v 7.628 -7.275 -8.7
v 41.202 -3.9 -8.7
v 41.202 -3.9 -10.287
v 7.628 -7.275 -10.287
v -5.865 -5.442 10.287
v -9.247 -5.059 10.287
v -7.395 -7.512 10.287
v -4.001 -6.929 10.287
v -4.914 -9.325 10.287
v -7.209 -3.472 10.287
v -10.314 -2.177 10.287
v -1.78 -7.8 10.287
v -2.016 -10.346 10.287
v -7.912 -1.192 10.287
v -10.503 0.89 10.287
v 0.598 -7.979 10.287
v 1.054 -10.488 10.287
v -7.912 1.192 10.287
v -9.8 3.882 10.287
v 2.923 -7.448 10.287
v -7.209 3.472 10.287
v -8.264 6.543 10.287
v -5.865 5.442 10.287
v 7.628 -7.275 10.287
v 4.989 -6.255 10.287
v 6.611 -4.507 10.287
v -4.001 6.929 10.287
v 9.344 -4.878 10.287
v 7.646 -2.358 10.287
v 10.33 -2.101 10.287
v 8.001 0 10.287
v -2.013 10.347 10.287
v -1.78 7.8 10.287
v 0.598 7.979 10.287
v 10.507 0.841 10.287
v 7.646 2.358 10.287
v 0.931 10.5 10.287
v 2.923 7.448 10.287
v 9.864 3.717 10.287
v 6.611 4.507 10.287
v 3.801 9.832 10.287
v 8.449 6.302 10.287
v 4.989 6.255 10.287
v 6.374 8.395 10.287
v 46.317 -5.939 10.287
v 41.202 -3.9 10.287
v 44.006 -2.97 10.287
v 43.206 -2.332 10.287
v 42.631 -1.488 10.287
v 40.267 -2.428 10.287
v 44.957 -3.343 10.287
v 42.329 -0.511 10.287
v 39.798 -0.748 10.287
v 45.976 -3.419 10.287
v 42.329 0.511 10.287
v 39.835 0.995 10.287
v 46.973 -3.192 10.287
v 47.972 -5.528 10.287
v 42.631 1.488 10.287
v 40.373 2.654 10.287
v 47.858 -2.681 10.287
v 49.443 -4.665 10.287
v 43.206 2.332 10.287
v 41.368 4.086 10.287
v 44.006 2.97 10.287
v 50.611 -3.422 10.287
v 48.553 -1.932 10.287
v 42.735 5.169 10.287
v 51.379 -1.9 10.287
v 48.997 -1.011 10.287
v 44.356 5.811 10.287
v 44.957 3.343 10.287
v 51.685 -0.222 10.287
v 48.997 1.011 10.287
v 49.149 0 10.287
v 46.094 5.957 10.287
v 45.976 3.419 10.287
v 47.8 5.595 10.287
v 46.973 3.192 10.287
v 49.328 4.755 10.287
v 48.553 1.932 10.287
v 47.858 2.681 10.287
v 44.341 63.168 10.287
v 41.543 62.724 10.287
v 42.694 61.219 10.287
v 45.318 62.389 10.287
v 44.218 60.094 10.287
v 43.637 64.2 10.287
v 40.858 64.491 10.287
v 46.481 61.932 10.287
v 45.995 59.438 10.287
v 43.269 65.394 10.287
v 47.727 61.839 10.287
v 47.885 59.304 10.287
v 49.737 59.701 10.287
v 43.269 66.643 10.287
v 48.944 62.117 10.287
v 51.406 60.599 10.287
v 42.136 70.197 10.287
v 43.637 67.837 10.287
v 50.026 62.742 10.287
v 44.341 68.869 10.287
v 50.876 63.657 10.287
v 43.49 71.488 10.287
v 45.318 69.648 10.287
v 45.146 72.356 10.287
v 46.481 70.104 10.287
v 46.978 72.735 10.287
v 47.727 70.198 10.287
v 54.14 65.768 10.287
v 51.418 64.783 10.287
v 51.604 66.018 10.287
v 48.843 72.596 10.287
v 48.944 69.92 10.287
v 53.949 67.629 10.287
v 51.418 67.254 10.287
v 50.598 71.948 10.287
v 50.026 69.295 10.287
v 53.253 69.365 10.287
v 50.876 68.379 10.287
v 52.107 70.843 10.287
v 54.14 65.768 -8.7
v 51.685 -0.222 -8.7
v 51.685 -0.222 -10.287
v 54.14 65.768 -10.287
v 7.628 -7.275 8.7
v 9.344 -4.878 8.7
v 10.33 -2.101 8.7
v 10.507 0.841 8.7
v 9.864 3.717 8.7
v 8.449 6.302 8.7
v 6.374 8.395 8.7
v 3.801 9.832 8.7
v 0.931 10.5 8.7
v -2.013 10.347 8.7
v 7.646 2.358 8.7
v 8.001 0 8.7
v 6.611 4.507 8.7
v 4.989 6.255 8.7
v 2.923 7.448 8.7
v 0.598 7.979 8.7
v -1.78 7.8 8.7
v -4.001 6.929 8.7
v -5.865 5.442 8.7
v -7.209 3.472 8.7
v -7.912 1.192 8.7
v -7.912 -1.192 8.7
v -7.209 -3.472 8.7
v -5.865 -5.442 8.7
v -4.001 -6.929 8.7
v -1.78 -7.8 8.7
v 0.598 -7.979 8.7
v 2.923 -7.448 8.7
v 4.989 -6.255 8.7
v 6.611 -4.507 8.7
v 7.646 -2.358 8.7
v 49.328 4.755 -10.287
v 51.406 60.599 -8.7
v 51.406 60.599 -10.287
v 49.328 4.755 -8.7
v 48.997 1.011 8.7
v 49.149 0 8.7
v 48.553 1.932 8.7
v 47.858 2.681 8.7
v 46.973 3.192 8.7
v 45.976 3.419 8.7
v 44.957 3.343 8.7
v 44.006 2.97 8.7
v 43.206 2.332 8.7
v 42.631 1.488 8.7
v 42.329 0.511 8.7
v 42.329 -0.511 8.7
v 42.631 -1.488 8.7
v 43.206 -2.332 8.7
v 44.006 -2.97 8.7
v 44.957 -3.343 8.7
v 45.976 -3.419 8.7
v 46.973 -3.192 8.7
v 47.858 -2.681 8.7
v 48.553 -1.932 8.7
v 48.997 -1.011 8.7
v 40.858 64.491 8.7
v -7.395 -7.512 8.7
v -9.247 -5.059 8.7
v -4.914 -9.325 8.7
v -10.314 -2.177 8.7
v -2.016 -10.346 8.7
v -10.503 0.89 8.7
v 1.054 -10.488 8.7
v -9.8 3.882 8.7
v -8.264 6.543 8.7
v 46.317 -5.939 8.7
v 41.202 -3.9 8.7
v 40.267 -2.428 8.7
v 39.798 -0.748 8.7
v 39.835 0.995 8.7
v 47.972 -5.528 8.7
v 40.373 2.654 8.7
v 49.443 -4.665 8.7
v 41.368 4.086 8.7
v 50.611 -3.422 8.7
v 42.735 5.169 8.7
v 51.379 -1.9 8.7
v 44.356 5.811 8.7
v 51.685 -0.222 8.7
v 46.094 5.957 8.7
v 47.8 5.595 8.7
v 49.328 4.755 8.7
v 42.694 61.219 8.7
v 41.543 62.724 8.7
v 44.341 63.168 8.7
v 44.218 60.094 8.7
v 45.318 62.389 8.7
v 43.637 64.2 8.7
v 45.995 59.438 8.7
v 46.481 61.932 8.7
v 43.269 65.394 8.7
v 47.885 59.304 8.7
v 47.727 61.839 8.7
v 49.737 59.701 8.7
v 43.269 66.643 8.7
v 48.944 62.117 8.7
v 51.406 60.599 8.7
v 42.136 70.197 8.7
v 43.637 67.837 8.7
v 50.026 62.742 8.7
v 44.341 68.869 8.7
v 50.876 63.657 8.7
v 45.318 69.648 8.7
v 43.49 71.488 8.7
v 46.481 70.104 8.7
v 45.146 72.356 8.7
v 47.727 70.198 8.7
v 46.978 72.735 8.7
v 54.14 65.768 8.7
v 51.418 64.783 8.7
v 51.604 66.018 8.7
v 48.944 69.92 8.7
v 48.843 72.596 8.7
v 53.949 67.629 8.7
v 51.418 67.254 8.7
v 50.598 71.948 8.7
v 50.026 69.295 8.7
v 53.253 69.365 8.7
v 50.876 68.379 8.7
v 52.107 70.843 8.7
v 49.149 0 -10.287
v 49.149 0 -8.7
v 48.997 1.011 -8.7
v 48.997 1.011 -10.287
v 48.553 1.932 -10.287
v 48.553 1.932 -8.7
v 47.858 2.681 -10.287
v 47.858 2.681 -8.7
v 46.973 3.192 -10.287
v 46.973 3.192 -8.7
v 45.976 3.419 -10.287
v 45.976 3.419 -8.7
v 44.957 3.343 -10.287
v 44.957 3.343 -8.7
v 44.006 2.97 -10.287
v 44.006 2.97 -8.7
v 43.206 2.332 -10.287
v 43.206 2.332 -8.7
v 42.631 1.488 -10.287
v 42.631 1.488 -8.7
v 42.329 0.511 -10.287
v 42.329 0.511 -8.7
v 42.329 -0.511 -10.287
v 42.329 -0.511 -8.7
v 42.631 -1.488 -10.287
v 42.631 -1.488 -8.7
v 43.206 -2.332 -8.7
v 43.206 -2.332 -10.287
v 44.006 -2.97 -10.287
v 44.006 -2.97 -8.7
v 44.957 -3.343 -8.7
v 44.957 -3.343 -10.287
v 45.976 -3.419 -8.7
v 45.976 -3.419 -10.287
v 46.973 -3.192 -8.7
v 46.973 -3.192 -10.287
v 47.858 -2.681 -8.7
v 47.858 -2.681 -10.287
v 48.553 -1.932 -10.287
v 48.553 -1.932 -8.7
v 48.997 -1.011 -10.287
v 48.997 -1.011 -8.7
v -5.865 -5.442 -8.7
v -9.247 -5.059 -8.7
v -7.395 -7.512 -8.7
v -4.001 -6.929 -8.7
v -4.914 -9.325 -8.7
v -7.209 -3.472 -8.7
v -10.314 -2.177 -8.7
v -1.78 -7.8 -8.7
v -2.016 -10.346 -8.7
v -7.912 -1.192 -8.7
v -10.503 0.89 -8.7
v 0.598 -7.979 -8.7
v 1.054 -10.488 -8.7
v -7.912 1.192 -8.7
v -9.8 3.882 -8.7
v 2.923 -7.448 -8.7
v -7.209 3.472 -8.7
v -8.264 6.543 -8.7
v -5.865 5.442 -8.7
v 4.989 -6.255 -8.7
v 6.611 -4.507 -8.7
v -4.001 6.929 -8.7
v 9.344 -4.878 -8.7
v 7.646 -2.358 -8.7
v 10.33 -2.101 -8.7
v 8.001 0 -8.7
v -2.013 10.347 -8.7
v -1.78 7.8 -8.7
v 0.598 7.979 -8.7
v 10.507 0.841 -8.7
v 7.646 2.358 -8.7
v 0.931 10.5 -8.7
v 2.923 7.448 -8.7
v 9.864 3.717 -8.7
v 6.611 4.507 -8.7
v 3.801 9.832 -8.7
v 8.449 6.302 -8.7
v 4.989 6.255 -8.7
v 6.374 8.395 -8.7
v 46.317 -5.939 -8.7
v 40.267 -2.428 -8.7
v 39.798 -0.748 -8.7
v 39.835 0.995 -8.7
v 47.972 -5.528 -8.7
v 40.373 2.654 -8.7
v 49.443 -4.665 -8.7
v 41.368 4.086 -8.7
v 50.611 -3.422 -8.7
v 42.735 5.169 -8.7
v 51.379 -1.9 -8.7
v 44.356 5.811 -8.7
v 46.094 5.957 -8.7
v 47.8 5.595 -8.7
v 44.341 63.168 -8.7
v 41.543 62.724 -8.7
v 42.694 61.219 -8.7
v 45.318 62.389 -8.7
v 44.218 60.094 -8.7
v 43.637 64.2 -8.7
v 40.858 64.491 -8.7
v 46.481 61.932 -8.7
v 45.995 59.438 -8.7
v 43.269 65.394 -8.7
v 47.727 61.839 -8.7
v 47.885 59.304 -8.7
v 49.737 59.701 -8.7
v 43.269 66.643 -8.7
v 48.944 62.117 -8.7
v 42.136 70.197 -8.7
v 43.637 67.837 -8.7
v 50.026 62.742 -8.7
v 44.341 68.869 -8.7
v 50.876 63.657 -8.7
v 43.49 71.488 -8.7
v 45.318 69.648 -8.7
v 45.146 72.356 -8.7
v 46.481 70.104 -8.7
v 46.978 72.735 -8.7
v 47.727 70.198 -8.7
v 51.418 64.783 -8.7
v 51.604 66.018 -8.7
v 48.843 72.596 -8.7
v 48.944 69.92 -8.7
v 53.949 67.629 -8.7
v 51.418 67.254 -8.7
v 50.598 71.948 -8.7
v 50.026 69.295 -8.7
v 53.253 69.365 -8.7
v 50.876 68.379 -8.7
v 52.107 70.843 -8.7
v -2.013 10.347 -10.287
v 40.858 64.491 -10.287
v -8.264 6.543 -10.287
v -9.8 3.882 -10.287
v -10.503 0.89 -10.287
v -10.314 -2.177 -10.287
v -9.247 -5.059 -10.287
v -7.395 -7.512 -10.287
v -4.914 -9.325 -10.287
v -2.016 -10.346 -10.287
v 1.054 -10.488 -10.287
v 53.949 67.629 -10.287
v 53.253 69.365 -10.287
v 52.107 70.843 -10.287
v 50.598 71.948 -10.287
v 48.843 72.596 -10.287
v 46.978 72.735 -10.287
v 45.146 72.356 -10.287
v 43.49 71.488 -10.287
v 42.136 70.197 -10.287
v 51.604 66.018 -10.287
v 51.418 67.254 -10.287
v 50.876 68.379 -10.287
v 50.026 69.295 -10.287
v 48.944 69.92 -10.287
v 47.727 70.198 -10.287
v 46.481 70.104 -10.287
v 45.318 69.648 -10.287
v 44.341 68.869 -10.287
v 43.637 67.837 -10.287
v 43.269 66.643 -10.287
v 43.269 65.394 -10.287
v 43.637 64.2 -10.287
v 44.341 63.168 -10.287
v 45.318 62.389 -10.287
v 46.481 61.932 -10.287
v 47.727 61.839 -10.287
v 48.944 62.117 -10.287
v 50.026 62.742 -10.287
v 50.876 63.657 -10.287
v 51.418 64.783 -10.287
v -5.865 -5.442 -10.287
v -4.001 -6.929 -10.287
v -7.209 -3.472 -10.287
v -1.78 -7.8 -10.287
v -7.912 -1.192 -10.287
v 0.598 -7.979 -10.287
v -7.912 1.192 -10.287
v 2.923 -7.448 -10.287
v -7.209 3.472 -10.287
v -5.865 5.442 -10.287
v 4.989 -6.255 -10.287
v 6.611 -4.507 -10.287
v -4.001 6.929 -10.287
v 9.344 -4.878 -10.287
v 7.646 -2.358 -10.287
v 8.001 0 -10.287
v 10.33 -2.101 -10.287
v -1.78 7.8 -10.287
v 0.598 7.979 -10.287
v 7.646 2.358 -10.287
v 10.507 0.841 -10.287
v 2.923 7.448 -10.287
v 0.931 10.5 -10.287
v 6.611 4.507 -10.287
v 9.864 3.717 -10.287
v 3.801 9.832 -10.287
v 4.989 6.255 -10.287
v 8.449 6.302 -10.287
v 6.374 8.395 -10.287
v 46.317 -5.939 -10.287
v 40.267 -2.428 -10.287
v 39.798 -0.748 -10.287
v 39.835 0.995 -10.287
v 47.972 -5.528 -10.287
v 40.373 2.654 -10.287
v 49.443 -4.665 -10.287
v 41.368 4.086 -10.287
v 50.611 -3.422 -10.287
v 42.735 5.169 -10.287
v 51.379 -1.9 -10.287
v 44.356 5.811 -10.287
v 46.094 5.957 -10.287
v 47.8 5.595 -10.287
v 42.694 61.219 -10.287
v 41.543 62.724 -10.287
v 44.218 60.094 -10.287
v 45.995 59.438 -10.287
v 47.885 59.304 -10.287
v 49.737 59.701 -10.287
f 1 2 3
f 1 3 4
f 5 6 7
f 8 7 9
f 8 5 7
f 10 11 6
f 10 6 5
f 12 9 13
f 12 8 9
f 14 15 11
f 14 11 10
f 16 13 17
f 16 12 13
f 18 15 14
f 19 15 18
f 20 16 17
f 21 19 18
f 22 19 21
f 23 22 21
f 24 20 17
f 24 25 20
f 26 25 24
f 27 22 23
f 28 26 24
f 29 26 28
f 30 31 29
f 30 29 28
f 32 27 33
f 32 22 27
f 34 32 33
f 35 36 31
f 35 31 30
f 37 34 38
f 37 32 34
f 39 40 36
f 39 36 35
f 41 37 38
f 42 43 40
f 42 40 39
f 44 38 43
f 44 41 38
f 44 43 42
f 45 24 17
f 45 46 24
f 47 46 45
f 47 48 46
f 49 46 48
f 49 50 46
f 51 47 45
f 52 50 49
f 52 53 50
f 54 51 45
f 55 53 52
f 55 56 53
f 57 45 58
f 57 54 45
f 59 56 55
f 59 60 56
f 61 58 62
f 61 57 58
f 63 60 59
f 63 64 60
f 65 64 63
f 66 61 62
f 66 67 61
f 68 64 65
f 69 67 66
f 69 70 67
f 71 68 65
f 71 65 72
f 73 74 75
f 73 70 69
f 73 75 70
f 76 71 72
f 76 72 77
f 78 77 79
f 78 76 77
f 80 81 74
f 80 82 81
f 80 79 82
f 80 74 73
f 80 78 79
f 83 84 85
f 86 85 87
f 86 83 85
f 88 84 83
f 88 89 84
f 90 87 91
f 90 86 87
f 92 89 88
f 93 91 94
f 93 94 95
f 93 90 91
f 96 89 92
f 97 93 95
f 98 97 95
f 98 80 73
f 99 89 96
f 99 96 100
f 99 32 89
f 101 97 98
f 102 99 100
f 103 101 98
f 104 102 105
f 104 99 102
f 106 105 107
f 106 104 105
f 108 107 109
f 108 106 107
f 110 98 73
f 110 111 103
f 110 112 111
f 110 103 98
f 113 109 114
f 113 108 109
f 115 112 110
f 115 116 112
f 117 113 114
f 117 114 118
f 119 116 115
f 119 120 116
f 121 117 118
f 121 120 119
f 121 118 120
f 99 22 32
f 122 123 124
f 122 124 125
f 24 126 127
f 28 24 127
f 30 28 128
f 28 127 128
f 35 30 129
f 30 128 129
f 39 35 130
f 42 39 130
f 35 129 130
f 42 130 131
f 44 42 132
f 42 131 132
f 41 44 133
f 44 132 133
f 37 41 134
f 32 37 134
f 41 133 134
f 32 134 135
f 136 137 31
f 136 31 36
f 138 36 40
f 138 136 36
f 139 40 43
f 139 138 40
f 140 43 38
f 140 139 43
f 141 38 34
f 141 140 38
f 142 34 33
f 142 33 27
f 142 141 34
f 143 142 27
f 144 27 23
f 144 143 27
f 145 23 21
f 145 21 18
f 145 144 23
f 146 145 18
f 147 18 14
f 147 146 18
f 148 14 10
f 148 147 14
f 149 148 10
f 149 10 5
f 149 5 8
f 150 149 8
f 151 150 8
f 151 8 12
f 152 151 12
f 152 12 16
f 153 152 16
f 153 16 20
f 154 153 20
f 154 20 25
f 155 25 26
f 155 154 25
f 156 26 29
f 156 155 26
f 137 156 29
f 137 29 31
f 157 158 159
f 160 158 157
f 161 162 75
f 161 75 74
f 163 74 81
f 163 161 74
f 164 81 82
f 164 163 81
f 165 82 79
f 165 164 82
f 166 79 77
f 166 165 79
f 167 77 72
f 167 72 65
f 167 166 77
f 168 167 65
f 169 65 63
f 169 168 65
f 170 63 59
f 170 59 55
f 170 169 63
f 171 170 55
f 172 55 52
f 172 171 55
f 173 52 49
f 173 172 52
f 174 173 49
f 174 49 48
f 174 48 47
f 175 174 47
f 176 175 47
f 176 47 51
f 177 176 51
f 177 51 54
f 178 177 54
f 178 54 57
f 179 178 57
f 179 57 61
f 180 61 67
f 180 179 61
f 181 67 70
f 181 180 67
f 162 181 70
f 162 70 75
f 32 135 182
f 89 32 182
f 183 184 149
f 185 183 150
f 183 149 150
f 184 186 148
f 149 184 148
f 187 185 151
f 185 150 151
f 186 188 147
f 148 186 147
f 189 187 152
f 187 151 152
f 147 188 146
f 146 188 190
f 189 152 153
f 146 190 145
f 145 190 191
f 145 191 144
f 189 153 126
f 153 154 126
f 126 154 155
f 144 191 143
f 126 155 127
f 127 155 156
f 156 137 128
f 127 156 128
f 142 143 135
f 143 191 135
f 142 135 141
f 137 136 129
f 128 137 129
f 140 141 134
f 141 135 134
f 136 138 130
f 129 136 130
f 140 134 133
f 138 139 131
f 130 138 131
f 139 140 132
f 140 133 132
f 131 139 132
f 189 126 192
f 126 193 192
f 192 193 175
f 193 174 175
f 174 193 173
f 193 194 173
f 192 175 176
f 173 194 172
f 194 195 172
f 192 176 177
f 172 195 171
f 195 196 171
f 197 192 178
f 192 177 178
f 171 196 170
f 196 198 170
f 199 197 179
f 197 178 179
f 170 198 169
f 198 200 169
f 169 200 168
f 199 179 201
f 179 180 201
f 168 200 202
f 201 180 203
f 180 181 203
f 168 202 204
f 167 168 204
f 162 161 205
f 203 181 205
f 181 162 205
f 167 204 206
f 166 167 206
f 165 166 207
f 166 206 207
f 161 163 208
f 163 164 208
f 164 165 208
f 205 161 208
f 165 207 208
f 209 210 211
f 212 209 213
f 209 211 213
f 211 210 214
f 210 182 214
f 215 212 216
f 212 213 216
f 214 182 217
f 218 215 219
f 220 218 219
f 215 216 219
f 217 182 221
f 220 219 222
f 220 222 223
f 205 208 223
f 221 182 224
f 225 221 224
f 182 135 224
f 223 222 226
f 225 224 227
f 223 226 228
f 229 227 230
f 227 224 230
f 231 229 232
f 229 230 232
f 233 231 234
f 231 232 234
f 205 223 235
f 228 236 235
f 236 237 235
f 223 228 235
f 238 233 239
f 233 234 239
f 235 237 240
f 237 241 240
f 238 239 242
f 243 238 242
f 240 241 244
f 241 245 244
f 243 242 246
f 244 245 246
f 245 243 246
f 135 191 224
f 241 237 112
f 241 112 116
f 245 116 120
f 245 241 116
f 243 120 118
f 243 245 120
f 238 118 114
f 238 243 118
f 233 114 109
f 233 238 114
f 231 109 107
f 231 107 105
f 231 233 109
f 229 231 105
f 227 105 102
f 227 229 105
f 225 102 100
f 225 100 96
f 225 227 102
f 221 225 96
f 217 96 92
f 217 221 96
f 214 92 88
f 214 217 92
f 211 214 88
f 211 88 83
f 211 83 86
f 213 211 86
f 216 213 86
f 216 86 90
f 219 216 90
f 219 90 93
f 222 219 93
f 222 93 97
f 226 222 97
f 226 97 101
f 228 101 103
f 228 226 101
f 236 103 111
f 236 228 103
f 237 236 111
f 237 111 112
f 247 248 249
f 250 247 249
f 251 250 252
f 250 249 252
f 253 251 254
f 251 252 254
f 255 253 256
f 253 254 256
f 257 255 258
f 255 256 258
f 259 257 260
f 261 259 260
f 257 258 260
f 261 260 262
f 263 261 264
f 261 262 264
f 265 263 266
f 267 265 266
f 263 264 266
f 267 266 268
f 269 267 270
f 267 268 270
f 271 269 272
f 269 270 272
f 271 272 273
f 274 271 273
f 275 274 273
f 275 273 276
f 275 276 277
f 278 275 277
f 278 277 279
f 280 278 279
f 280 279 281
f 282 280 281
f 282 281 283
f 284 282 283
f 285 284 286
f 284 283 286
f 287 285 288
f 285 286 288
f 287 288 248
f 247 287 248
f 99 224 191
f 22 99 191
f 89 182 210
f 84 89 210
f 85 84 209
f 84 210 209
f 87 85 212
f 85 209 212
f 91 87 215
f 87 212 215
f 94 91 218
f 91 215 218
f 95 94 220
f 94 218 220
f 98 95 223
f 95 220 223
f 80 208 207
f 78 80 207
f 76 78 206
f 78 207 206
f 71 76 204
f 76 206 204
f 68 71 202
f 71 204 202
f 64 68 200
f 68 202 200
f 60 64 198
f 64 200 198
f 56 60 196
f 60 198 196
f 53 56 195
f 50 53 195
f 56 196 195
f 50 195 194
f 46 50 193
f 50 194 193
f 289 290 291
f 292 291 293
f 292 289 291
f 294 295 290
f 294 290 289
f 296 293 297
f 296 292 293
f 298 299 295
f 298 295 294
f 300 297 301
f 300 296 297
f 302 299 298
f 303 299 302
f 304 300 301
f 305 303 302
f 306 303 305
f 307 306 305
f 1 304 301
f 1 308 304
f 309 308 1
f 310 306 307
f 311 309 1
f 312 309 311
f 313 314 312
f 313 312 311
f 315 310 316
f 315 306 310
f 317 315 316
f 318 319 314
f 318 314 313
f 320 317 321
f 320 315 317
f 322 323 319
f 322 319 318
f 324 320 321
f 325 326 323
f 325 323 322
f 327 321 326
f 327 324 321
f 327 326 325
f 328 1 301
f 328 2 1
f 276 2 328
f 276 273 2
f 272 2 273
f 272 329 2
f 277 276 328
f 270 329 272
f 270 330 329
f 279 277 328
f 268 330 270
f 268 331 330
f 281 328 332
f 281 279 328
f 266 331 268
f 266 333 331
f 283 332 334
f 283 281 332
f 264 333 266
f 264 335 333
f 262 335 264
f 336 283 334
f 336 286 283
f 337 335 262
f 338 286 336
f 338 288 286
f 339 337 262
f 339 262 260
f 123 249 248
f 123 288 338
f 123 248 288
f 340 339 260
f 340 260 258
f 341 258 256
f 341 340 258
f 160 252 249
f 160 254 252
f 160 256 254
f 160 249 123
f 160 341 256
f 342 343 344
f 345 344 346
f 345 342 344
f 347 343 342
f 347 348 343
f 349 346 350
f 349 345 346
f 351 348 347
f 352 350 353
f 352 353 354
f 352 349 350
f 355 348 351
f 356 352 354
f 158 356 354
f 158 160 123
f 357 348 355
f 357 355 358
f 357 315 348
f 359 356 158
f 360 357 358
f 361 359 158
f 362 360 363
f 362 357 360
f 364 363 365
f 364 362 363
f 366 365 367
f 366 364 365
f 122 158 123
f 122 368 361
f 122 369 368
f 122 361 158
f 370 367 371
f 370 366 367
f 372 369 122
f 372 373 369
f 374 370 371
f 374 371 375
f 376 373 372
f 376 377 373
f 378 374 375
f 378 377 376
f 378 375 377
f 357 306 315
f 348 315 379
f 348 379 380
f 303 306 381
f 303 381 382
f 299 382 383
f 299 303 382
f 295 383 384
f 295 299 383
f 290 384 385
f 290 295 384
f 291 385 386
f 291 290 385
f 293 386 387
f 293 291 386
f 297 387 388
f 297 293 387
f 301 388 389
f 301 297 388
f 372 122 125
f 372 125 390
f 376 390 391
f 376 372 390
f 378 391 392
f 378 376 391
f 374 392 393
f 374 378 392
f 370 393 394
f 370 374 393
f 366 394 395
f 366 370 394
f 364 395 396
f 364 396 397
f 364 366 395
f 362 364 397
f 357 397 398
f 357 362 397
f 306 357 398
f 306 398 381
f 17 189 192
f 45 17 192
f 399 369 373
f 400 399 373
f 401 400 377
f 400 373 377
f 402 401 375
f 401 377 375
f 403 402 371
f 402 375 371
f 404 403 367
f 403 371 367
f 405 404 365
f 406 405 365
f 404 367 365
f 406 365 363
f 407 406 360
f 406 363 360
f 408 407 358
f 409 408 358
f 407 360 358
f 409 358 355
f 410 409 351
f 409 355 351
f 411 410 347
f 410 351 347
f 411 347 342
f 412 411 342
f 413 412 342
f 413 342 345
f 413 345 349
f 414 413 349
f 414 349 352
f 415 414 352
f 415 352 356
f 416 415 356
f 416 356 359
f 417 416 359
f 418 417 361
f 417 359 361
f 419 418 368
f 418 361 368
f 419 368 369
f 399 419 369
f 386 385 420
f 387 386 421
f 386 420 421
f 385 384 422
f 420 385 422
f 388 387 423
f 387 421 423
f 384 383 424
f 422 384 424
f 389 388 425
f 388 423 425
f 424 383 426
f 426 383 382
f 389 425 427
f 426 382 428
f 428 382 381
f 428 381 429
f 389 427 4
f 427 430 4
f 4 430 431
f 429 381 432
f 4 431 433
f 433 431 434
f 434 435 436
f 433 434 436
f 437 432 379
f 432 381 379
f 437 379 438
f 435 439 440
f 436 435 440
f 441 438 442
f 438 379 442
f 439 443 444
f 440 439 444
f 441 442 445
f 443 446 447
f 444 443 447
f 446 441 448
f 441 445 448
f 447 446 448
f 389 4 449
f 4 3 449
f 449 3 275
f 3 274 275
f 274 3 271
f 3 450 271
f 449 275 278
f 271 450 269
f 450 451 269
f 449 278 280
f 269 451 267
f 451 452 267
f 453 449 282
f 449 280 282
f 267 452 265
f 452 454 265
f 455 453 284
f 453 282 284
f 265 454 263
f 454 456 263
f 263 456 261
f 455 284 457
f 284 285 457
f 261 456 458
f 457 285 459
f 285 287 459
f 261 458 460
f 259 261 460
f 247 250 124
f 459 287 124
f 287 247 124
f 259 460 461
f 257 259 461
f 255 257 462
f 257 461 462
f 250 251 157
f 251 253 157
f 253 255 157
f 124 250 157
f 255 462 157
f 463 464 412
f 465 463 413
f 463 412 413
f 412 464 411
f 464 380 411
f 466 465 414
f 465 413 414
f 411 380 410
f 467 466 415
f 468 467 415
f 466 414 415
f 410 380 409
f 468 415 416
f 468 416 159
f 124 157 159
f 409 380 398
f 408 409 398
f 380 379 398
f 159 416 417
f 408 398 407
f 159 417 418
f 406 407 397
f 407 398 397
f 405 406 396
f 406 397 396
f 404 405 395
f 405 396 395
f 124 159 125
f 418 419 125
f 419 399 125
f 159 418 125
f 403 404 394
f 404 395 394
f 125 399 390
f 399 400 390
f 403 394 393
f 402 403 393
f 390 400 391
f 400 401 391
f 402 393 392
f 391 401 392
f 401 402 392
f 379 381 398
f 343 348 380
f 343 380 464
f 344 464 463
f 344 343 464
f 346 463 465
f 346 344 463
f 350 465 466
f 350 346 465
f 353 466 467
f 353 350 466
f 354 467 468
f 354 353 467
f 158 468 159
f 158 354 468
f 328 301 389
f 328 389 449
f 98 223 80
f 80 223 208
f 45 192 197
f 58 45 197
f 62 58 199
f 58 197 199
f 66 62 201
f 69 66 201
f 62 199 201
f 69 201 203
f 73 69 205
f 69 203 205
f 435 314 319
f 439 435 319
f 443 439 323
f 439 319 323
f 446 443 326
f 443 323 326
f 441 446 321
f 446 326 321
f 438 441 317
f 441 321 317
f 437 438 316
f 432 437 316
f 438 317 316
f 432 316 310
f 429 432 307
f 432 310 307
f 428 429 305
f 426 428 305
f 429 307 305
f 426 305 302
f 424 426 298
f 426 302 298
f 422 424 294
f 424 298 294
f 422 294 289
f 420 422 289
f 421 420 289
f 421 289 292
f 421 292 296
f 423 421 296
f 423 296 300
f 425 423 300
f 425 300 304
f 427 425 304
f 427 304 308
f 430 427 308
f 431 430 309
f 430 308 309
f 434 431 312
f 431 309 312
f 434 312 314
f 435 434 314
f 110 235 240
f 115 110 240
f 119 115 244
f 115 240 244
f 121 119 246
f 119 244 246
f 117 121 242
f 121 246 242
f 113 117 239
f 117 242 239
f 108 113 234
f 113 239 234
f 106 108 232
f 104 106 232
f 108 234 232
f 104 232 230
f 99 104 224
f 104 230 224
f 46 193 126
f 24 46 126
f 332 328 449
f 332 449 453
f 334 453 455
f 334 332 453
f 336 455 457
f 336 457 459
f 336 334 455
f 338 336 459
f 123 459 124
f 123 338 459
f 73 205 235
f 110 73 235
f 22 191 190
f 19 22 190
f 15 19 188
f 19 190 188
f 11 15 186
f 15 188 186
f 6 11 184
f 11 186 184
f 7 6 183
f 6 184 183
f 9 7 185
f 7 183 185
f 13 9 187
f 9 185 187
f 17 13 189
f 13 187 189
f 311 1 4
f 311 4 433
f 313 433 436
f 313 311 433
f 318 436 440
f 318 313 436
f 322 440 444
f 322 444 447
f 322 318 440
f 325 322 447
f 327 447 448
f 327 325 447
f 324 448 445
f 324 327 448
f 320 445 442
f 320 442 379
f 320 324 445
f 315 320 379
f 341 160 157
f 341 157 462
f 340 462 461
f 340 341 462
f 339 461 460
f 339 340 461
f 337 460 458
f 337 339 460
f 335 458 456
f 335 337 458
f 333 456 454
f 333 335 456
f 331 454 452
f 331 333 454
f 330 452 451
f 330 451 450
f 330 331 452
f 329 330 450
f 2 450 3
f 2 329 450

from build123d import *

# Parameters (mm, degrees)
BOSS_EXTRUDE1_START = 8.6995
SKETCH1_R           = 3.429
SKETCH1_R_2         = 4.191
SKETCH1_R_3         = 8.001
BOSS_EXTRUDE1_DEPTH = 1.5875
BOSS_EXTRUDE2_START = -8.6995
SKETCH1_4_R         = 3.429
SKETCH1_4_R_2       = 4.191
SKETCH1_4_R_3       = 8.001
BOSS_EXTRUDE2_DEPTH = 1.5875


with BuildPart() as part:
    # Sketch1 → Boss-Extrude1 (new body)
    with BuildSketch(Plane.XY.offset(BOSS_EXTRUDE1_START)):
        with BuildLine():
            ThreePointArc((54.139680923, 65.768068925), (49.743182937, 72.33320285), (42.136254402, 70.196659792))
            Line((42.136254402, 70.196659792), (-8.264104742, 6.543489422))
            ThreePointArc((-8.264104742, 6.543489422), (-9.247450164, -5.059382025), (1.0541, -10.488162575))
            Line((1.0541, -10.488162575), (46.3169, -5.939080012))
            ThreePointArc((46.3169, -5.939080012), (50.071526337, -4.085728764), (51.684874278, -0.221891526))
            Line((51.684874278, -0.221891526), (54.139680923, 65.768068925))
        make_face()
        with BuildLine():
            Line((-2.01262532, 10.347077864), (40.857998083, 64.490562984))
            ThreePointArc((40.857998083, 64.490562984), (45.083483729, 59.703371208), (51.405639077, 60.599075292))
            Line((51.405639077, 60.599075292), (49.328254105, 4.754940937))
            ThreePointArc((49.328254105, 4.754940937), (41.368473663, 4.085728764), (41.201602766, -3.900390677))
            Line((41.201602766, -3.900390677), (7.628402366, -7.274624275))
            ThreePointArc((7.628402366, -7.274624275), (9.247450164, 5.059382025), (-2.01262532, 10.347077864))
        make_face(mode=Mode.SUBTRACT)
        with Locations((45.72, 0)):
            Circle(SKETCH1_R, mode=Mode.SUBTRACT)
        with Locations((47.413333333, 66.018287029)):
            Circle(SKETCH1_R_2, mode=Mode.SUBTRACT)
        Circle(SKETCH1_R_3, mode=Mode.SUBTRACT)
    extrude(amount=BOSS_EXTRUDE1_DEPTH)


with BuildPart() as body_2:
    # Sketch1<4> → Boss-Extrude2 (new body)
    with BuildSketch(Plane.XY.offset(BOSS_EXTRUDE2_START)):
        with BuildLine():
            ThreePointArc((54.139680923, 65.768068925), (49.743182937, 72.33320285), (42.136254402, 70.196659792))
            Line((42.136254402, 70.196659792), (-8.264104742, 6.543489422))
            ThreePointArc((-8.264104742, 6.543489422), (-9.247450164, -5.059382025), (1.0541, -10.488162575))
            Line((1.0541, -10.488162575), (46.3169, -5.939080012))
            ThreePointArc((46.3169, -5.939080012), (50.071526337, -4.085728764), (51.684874278, -0.221891526))
            Line((51.684874278, -0.221891526), (54.139680923, 65.768068925))
        make_face()
        with BuildLine():
            Line((-2.01262532, 10.347077864), (40.857998083, 64.490562984))
            ThreePointArc((40.857998083, 64.490562984), (45.083483729, 59.703371208), (51.405639077, 60.599075292))
            Line((51.405639077, 60.599075292), (49.328254105, 4.754940937))
            ThreePointArc((49.328254105, 4.754940937), (41.368473663, 4.085728764), (41.201602766, -3.900390677))
            Line((41.201602766, -3.900390677), (7.628402366, -7.274624275))
            ThreePointArc((7.628402366, -7.274624275), (9.247450164, 5.059382025), (-2.01262532, 10.347077864))
        make_face(mode=Mode.SUBTRACT)
        with Locations((45.72, 0)):
            Circle(SKETCH1_4_R, mode=Mode.SUBTRACT)
        with Locations((47.413333333, 66.018287029)):
            Circle(SKETCH1_4_R_2, mode=Mode.SUBTRACT)
        Circle(SKETCH1_4_R_3, mode=Mode.SUBTRACT)
    extrude(amount=-BOSS_EXTRUDE2_DEPTH)


solid = Compound([part.part, body_2.part])
